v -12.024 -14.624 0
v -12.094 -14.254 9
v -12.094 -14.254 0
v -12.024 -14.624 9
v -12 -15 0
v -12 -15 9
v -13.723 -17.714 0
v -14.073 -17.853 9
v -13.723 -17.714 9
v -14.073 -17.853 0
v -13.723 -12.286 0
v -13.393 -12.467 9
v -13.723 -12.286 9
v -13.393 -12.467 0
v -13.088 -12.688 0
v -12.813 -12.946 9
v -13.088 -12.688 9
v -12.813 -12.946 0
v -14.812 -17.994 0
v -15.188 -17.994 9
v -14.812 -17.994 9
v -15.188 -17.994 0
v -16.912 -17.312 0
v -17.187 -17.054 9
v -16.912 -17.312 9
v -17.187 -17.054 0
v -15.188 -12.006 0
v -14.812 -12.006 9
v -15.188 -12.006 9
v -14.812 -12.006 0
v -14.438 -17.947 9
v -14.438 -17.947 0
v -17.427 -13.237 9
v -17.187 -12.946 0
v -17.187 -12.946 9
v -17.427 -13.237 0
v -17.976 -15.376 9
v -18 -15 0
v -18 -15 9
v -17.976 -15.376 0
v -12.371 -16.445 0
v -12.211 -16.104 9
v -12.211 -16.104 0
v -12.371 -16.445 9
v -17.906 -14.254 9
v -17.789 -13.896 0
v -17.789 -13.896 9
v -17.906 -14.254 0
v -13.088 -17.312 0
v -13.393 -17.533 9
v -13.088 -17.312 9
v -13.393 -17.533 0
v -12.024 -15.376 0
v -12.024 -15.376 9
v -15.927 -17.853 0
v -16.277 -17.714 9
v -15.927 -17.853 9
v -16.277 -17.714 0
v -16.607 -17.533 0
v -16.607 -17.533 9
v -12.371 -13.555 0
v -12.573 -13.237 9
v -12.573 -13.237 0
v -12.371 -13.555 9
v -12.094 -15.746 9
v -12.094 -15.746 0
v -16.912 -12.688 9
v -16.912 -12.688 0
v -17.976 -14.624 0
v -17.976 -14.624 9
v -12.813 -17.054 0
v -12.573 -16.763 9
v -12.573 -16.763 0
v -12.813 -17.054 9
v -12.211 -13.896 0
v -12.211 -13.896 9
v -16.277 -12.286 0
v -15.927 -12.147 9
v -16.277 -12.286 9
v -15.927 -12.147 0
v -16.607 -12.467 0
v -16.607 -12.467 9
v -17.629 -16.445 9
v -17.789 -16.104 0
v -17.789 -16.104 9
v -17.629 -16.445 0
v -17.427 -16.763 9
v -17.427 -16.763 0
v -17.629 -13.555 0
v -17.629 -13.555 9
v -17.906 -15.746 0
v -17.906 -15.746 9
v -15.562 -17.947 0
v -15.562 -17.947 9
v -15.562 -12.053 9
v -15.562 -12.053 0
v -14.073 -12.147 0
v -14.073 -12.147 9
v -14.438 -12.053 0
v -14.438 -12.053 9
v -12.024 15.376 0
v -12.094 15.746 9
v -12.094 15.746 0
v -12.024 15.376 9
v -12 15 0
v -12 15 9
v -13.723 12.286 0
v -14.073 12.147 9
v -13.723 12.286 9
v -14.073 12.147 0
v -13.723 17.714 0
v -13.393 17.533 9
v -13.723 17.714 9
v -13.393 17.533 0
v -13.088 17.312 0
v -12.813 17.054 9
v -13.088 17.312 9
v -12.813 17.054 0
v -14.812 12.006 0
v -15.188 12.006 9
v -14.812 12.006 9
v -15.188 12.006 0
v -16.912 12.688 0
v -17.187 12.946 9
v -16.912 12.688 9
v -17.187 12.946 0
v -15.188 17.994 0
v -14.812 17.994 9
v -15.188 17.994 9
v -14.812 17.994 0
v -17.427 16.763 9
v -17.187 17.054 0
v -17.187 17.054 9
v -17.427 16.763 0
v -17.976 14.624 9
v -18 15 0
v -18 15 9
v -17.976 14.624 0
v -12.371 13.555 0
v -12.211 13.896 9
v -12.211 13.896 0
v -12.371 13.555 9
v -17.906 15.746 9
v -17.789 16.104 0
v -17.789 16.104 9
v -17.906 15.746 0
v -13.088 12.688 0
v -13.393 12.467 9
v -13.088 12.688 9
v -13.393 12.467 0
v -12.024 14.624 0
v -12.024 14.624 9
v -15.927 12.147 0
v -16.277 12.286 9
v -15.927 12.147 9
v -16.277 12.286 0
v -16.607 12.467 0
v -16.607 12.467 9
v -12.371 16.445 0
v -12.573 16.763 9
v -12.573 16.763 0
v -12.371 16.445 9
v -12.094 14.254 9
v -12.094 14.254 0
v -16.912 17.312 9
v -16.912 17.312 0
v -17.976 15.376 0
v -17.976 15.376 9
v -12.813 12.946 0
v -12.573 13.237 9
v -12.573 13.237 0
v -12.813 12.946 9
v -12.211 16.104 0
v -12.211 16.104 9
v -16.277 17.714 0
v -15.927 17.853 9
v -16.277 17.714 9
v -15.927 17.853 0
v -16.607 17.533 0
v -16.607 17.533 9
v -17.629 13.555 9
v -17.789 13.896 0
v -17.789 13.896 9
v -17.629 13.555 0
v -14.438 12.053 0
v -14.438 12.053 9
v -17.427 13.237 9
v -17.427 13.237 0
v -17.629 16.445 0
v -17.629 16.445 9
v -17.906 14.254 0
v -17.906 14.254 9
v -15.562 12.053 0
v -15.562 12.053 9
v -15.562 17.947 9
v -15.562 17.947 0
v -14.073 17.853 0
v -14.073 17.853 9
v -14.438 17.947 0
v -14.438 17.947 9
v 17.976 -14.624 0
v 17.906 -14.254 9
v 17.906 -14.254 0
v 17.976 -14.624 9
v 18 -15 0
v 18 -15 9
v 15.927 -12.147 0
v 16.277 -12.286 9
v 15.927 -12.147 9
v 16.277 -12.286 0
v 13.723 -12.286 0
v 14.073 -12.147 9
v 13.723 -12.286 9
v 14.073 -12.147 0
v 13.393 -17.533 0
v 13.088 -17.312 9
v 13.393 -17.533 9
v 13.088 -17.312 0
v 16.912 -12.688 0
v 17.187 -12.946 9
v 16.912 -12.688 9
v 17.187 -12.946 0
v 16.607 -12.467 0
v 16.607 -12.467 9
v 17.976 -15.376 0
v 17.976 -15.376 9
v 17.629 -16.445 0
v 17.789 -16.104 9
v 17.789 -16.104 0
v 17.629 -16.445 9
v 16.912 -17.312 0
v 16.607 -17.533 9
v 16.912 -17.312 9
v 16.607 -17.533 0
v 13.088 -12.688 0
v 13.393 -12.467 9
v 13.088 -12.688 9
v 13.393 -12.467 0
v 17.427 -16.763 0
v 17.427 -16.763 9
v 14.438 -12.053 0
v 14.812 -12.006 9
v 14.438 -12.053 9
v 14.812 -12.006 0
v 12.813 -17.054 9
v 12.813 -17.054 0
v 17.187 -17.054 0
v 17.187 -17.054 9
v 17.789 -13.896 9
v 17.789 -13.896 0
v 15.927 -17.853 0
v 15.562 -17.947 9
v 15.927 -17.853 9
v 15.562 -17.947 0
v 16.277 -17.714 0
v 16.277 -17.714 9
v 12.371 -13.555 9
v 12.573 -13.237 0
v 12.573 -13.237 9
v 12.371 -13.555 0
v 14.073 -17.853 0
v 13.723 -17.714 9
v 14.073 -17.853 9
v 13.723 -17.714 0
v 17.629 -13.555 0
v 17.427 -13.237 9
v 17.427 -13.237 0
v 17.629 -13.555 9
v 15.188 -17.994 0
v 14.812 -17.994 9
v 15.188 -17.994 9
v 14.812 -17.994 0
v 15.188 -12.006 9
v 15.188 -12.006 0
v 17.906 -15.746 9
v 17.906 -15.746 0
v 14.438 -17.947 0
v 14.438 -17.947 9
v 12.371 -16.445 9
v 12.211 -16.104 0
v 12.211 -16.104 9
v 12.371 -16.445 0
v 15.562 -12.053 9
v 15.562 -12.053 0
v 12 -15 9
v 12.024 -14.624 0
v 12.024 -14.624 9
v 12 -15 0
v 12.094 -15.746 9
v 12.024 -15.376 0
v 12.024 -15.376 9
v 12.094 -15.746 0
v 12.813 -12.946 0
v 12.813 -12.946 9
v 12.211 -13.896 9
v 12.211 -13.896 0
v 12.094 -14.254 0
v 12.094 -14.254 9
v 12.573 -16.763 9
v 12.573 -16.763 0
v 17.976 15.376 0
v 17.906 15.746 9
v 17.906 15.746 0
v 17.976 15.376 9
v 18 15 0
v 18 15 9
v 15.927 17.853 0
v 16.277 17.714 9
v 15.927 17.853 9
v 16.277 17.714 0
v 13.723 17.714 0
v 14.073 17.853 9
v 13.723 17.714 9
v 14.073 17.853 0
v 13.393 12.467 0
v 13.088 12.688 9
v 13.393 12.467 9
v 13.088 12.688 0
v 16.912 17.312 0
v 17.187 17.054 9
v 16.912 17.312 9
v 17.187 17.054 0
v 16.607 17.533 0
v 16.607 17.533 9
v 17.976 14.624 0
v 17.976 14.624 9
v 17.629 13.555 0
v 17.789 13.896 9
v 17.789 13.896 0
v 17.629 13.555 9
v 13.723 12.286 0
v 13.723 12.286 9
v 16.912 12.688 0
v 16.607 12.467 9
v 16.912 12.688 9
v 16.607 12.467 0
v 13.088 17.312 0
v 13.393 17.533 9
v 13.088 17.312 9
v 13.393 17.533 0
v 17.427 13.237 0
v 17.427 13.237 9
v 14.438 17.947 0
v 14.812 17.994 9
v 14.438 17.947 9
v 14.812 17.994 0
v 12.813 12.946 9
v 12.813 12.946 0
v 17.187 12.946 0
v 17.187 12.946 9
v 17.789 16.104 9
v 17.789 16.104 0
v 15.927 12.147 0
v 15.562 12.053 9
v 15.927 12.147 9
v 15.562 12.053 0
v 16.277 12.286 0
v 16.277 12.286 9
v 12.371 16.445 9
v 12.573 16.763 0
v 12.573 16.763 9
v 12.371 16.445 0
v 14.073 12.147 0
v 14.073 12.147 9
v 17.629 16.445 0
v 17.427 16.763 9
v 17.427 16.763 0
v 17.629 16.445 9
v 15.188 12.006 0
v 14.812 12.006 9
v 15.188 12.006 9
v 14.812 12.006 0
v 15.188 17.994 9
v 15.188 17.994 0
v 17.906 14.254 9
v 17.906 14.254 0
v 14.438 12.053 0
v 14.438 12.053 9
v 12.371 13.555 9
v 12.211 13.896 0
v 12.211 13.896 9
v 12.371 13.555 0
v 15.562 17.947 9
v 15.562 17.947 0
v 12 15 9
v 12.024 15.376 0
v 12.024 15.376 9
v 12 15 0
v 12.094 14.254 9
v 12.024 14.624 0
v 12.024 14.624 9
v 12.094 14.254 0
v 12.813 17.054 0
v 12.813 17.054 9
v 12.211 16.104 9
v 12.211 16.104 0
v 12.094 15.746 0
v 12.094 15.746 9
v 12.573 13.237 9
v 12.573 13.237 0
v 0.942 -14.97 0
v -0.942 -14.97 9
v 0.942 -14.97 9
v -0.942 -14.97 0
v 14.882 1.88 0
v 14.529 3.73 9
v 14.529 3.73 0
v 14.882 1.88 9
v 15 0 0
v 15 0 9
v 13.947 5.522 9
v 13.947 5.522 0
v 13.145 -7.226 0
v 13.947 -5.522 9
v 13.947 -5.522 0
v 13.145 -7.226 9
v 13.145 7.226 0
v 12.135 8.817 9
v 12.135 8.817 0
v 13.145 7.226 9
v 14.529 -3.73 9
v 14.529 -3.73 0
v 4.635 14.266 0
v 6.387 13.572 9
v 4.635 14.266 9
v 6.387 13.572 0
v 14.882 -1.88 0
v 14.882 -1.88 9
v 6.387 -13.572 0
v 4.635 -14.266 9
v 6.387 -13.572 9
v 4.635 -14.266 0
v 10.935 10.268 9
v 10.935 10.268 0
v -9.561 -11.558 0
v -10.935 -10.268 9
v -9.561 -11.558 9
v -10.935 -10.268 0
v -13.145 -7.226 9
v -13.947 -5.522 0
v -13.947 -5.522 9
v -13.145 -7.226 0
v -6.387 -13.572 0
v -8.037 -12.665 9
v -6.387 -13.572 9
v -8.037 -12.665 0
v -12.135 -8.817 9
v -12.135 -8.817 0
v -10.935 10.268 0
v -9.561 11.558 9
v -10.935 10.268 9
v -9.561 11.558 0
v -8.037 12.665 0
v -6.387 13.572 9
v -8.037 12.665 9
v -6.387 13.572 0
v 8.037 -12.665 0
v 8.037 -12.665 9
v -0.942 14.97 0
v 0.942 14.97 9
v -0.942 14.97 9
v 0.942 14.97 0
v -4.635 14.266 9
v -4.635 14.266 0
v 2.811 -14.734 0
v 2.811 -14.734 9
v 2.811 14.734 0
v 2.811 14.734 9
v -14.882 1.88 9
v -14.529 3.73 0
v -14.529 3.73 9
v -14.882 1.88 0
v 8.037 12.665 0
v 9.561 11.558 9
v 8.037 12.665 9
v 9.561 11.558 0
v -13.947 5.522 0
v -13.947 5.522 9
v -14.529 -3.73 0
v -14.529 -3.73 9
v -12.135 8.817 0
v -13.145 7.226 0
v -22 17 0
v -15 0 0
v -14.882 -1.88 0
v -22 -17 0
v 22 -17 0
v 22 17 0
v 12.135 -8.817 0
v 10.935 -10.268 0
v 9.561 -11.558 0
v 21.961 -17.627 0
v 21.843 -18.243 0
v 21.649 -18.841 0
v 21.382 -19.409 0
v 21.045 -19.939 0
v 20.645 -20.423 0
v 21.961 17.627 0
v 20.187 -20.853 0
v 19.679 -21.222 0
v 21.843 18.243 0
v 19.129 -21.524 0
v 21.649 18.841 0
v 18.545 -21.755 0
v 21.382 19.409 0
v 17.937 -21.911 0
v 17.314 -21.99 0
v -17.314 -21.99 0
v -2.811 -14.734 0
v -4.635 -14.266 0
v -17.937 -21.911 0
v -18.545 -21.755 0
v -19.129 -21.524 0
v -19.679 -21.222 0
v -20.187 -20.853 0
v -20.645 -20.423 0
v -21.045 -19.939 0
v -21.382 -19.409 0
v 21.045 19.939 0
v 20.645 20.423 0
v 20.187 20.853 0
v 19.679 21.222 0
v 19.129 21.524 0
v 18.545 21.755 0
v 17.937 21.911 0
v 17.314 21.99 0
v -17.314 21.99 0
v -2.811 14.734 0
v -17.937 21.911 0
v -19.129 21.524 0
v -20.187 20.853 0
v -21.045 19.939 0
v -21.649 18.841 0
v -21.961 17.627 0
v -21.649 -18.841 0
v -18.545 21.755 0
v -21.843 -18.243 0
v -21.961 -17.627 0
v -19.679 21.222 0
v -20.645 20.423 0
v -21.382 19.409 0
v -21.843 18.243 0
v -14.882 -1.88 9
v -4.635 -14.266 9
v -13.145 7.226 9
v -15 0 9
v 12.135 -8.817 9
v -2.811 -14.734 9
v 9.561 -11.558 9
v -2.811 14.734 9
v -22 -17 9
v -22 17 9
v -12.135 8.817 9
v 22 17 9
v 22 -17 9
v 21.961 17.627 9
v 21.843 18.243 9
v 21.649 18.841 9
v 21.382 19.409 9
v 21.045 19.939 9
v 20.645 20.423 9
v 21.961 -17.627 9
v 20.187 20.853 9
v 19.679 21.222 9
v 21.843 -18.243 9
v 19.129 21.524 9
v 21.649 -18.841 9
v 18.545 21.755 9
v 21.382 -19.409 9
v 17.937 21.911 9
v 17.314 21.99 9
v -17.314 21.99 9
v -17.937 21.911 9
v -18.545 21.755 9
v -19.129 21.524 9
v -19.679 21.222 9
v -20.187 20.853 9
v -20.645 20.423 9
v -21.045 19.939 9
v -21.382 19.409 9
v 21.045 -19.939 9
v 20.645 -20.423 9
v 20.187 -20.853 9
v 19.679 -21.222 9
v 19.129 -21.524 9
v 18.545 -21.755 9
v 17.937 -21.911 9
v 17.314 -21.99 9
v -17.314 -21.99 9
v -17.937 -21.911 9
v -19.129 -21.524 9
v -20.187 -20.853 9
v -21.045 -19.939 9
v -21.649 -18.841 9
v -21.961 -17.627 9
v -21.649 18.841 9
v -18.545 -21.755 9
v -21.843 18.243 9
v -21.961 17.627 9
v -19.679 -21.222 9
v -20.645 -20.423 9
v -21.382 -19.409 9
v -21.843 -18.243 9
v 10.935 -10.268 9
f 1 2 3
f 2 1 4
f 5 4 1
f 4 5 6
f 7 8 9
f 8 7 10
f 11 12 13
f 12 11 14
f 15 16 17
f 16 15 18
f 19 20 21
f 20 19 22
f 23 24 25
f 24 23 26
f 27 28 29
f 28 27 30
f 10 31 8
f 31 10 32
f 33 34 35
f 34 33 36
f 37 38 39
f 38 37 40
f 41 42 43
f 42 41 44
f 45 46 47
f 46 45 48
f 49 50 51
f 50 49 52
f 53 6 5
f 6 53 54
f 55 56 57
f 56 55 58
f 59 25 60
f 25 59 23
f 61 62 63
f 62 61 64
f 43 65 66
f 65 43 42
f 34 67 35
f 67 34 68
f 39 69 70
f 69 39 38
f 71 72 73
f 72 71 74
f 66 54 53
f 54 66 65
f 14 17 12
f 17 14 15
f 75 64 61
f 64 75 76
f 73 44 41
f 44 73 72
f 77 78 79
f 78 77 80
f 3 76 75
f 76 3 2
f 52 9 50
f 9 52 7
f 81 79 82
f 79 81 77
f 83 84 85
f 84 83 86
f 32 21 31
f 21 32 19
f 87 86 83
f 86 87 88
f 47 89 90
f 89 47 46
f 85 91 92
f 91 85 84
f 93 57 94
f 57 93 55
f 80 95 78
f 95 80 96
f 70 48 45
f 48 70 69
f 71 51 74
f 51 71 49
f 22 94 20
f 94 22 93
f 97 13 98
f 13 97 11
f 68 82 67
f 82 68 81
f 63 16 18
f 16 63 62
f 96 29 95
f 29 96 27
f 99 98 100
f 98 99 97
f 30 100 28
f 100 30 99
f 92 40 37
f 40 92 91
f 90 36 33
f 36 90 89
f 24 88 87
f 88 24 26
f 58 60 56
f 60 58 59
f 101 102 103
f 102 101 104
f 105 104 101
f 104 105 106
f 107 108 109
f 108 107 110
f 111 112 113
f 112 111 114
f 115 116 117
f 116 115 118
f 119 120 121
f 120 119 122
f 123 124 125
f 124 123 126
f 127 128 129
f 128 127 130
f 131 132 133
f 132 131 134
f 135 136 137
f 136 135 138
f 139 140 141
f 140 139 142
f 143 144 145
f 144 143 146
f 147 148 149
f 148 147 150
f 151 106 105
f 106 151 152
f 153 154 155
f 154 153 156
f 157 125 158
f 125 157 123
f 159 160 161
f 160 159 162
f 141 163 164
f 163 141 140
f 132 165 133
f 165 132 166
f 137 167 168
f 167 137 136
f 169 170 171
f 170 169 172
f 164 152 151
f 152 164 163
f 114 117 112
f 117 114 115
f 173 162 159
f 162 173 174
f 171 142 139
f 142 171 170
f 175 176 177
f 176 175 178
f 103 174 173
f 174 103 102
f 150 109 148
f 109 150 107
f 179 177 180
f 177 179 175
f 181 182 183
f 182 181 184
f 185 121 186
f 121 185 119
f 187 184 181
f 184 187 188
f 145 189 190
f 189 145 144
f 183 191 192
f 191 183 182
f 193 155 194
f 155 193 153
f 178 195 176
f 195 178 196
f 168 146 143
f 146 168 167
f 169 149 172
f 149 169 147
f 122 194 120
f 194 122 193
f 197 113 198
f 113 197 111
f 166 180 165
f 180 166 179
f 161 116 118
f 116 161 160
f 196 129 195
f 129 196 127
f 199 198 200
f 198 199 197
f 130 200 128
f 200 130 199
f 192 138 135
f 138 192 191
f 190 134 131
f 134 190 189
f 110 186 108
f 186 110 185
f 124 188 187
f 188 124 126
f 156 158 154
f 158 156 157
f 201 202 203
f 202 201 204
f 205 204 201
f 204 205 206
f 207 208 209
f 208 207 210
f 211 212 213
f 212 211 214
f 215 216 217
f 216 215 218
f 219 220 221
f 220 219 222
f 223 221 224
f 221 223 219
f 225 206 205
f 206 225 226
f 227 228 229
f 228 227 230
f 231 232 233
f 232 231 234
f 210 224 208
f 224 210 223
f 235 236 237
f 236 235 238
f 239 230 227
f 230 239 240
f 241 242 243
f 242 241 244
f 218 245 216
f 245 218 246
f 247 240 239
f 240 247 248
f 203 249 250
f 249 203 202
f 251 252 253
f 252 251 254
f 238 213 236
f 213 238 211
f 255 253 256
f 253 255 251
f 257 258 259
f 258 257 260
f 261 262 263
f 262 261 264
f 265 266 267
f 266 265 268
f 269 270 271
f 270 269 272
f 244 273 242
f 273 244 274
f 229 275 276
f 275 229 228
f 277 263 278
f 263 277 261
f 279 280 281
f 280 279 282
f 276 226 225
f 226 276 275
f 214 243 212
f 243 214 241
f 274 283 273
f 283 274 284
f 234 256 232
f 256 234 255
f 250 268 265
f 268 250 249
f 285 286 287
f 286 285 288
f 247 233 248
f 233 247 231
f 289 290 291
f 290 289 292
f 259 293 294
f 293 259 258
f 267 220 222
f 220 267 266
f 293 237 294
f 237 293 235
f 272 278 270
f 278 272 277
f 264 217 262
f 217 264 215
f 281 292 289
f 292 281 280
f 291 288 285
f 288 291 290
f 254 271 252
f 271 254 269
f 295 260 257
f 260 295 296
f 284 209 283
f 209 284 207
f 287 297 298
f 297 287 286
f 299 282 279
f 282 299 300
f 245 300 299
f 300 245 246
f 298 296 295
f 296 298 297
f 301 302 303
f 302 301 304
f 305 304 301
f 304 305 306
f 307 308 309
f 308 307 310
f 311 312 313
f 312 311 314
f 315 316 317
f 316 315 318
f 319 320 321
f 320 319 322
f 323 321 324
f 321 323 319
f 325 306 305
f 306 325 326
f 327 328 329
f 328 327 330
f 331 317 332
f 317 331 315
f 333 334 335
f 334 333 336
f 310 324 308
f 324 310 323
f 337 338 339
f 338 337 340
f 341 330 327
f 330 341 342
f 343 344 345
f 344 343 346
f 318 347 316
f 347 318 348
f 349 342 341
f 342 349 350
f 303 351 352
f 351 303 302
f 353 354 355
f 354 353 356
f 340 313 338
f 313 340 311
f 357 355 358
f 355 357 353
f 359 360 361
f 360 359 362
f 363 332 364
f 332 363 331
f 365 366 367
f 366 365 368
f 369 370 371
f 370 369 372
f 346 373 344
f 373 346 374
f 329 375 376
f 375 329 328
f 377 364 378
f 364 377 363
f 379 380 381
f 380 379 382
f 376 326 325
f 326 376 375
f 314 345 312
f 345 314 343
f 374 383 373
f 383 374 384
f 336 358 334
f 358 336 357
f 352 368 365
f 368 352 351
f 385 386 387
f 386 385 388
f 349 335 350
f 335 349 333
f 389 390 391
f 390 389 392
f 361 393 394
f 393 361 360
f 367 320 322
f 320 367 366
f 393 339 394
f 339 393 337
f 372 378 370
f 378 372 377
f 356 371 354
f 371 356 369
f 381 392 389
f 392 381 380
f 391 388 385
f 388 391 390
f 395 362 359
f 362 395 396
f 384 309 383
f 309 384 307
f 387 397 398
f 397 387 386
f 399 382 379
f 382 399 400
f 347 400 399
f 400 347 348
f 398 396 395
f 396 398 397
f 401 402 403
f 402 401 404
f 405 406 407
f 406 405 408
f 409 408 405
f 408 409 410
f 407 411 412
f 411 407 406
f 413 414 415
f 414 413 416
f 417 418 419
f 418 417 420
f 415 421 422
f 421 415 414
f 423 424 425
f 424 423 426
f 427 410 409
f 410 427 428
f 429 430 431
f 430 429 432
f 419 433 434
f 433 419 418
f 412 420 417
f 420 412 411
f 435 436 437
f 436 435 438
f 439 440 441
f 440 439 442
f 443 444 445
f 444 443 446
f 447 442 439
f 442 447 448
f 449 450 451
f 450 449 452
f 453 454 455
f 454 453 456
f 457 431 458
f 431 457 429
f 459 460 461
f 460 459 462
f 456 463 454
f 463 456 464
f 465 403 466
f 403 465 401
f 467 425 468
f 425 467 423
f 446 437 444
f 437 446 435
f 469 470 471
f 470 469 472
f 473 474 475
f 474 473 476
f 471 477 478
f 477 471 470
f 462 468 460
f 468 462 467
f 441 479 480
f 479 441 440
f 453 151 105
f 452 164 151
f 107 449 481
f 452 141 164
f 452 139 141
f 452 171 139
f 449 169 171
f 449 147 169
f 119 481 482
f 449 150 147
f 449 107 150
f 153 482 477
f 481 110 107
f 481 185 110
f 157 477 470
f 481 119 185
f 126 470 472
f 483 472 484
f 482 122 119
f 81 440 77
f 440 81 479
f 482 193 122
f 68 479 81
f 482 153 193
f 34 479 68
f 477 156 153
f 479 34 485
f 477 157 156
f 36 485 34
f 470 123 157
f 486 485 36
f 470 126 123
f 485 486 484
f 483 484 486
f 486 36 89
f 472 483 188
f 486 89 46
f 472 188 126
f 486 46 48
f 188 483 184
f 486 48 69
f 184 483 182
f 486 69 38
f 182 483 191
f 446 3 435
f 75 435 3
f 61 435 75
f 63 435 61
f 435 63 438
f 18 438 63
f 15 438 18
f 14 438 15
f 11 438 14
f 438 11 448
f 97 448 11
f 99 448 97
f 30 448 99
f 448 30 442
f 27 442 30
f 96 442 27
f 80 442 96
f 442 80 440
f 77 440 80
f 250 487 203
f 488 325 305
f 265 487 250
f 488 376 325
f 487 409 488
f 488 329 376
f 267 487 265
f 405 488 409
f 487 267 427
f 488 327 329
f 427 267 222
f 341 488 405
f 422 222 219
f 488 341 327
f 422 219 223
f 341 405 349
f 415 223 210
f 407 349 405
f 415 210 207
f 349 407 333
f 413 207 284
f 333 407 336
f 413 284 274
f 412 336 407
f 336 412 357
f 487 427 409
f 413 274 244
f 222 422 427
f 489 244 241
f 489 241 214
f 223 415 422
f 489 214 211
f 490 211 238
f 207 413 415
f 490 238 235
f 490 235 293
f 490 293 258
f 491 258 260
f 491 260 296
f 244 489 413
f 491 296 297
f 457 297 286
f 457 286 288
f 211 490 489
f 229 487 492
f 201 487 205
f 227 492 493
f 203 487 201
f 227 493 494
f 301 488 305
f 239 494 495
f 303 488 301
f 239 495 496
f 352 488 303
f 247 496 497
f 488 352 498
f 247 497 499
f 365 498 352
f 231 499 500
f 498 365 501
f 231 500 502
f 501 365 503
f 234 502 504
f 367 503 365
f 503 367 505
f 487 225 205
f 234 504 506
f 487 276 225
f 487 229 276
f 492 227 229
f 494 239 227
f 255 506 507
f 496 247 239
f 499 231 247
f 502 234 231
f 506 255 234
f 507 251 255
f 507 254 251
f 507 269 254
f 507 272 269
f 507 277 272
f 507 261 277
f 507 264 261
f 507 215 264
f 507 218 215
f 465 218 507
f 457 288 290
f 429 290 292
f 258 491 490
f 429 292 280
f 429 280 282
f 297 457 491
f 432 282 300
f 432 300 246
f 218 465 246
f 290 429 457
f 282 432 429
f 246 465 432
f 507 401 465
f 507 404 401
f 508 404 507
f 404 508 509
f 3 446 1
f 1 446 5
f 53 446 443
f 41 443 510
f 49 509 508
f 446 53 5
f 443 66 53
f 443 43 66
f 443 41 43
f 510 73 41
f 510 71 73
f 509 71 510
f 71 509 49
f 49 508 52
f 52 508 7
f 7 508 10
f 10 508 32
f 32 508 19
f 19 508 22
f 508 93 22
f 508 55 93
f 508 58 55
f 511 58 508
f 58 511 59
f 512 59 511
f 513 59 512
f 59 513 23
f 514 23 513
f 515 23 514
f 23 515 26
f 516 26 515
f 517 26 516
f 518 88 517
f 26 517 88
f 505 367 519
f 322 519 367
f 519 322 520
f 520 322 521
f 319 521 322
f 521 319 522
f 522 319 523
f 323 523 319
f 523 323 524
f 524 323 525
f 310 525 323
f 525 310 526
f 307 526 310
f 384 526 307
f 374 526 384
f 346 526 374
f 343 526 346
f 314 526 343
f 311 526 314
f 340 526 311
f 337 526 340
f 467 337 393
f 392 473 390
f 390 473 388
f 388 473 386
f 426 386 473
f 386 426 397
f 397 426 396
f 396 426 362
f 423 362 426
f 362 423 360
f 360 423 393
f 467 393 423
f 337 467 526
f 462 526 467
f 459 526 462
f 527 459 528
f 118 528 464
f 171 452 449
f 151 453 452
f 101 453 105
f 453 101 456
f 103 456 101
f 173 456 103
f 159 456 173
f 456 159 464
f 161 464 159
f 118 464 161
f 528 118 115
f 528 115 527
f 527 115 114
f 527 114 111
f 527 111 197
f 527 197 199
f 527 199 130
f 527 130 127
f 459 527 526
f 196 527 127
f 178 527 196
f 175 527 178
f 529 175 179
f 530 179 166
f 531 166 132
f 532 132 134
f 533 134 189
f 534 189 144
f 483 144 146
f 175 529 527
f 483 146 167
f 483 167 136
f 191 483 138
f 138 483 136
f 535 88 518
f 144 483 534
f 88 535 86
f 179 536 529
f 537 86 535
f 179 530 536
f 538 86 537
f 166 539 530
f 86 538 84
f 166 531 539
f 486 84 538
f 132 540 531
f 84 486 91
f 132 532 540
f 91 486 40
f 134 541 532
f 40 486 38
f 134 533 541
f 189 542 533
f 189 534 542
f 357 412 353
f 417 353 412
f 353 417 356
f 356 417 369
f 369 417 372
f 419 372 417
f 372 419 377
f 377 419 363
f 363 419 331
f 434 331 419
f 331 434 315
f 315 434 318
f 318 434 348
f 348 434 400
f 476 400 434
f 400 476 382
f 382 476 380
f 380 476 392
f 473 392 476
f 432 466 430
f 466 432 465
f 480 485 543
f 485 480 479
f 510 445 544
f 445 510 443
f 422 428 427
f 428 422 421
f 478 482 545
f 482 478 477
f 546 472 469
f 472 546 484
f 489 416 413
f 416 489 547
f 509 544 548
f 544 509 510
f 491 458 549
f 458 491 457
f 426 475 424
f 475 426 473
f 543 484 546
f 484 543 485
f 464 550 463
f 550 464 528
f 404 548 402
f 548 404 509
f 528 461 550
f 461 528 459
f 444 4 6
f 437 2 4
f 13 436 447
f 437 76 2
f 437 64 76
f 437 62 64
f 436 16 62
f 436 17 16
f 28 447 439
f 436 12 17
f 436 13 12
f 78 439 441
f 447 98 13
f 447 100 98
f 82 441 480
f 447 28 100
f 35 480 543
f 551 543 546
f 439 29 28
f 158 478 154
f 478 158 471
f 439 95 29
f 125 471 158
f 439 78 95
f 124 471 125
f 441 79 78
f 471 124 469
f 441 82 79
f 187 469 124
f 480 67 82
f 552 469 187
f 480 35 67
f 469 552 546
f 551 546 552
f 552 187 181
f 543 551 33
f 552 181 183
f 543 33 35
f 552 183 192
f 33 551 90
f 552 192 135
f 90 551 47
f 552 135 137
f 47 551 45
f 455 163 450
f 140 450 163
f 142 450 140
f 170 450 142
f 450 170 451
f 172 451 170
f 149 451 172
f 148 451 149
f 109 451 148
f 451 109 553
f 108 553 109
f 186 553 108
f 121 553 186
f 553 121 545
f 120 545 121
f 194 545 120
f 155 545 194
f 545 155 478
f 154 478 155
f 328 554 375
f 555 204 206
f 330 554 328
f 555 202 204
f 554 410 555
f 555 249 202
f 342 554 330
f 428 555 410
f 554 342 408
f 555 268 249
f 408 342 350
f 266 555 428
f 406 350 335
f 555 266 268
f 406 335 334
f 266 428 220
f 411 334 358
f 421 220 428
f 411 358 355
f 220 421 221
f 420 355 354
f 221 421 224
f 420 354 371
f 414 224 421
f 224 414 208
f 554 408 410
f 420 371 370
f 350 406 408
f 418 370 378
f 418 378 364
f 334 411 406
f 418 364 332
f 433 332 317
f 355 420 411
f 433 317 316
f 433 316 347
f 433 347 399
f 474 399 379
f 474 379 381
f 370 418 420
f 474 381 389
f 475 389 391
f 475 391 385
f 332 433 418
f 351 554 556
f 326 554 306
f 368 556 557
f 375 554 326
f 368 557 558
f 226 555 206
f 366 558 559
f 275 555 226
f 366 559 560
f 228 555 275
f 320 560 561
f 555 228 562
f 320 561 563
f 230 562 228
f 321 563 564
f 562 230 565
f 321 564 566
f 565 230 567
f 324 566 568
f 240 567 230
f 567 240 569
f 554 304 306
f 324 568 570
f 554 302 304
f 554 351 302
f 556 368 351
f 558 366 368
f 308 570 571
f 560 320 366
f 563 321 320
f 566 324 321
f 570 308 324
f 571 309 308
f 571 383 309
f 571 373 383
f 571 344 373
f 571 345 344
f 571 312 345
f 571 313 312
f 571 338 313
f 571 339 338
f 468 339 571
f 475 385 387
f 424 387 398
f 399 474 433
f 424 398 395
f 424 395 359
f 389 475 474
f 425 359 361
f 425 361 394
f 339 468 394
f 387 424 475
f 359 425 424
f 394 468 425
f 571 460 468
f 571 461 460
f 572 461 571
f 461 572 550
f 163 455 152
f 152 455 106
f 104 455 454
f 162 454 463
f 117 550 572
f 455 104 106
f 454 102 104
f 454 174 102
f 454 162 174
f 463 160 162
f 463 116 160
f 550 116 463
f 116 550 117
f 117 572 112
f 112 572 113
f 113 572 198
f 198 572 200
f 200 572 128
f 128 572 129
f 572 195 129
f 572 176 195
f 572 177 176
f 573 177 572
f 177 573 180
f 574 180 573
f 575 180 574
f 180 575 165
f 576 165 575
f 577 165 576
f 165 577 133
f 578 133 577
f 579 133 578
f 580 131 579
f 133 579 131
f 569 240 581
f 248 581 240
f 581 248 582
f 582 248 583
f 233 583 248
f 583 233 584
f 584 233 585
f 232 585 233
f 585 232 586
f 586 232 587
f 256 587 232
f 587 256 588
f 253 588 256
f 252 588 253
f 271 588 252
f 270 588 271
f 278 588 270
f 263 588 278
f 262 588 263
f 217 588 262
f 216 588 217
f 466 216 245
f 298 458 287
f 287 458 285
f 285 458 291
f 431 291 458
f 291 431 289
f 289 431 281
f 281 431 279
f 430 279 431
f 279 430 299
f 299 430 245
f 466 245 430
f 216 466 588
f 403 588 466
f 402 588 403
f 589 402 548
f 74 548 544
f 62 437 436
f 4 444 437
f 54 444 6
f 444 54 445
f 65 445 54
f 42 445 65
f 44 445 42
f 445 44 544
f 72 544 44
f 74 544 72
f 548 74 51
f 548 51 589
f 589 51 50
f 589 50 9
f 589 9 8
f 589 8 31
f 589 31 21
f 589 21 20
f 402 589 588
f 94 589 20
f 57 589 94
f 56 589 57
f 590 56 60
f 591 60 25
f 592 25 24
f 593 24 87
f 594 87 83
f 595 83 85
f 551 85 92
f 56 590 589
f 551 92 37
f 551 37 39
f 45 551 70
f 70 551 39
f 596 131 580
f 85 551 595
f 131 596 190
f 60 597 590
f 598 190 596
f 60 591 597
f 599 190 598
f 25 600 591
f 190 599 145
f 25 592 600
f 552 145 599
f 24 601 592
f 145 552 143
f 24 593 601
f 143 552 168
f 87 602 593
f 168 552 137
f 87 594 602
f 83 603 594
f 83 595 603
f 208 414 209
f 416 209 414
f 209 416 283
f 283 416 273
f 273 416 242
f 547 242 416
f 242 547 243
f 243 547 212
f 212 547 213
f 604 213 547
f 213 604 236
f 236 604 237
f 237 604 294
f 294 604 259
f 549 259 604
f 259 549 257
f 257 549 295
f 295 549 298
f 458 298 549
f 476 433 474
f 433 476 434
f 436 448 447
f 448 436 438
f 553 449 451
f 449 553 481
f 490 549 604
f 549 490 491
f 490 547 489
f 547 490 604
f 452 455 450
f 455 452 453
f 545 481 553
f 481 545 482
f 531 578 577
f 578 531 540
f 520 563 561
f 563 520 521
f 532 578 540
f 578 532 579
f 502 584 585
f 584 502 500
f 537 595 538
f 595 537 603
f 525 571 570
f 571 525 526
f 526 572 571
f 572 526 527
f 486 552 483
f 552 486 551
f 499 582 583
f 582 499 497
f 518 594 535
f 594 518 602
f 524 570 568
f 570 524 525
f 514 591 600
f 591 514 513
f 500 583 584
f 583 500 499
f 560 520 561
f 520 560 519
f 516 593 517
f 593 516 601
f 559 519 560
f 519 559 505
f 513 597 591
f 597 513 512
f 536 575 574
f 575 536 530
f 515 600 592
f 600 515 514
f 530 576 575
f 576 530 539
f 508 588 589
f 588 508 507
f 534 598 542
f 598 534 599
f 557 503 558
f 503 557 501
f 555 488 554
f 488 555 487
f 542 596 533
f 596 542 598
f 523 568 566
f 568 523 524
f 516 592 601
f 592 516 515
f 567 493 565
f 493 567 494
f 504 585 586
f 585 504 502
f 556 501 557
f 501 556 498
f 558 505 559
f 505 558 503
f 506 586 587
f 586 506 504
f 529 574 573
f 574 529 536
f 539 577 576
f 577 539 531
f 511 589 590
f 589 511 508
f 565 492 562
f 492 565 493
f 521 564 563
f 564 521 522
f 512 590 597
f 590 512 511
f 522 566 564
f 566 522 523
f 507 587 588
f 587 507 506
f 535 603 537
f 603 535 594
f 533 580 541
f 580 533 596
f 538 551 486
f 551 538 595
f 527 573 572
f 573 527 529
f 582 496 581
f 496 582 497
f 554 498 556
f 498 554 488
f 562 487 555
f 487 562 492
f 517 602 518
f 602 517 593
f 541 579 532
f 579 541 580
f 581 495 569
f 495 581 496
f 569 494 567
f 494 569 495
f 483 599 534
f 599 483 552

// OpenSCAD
$fn = 50;

difference() {
	union() {
		hull() {
			translate(v = [-17.0, 17.0, 0]) {
				cylinder(h = 9, r = 5);
			}
			translate(v = [17.0, 17.0, 0]) {
				cylinder(h = 9, r = 5);
			}
			translate(v = [-17.0, -17.0, 0]) {
				cylinder(h = 9, r = 5);
			}
			translate(v = [17.0, -17.0, 0]) {
				cylinder(h = 9, r = 5);
			}
		}
	}
	union() {
		translate(v = [-15.0, -15.0, -100.0]) {
			cylinder(h = 200, r = 3.0);
		}
		translate(v = [-15.0, 15.0, -100.0]) {
			cylinder(h = 200, r = 3.0);
		}
		translate(v = [15.0, -15.0, -100.0]) {
			cylinder(h = 200, r = 3.0);
		}
		translate(v = [15.0, 15.0, -100.0]) {
			cylinder(h = 200, r = 3.0);
		}
		translate(v = [-15.0, -15.0, -100.0]) {
			cylinder(h = 200, r = 1.5);
		}
		translate(v = [-15.0, 15.0, -100.0]) {
			cylinder(h = 200, r = 1.5);
		}
		translate(v = [15.0, -15.0, -100.0]) {
			cylinder(h = 200, r = 1.5);
		}
		translate(v = [15.0, 15.0, -100.0]) {
			cylinder(h = 200, r = 1.5);
		}
		cylinder(h = 9, r = 15.0);
	}
}
